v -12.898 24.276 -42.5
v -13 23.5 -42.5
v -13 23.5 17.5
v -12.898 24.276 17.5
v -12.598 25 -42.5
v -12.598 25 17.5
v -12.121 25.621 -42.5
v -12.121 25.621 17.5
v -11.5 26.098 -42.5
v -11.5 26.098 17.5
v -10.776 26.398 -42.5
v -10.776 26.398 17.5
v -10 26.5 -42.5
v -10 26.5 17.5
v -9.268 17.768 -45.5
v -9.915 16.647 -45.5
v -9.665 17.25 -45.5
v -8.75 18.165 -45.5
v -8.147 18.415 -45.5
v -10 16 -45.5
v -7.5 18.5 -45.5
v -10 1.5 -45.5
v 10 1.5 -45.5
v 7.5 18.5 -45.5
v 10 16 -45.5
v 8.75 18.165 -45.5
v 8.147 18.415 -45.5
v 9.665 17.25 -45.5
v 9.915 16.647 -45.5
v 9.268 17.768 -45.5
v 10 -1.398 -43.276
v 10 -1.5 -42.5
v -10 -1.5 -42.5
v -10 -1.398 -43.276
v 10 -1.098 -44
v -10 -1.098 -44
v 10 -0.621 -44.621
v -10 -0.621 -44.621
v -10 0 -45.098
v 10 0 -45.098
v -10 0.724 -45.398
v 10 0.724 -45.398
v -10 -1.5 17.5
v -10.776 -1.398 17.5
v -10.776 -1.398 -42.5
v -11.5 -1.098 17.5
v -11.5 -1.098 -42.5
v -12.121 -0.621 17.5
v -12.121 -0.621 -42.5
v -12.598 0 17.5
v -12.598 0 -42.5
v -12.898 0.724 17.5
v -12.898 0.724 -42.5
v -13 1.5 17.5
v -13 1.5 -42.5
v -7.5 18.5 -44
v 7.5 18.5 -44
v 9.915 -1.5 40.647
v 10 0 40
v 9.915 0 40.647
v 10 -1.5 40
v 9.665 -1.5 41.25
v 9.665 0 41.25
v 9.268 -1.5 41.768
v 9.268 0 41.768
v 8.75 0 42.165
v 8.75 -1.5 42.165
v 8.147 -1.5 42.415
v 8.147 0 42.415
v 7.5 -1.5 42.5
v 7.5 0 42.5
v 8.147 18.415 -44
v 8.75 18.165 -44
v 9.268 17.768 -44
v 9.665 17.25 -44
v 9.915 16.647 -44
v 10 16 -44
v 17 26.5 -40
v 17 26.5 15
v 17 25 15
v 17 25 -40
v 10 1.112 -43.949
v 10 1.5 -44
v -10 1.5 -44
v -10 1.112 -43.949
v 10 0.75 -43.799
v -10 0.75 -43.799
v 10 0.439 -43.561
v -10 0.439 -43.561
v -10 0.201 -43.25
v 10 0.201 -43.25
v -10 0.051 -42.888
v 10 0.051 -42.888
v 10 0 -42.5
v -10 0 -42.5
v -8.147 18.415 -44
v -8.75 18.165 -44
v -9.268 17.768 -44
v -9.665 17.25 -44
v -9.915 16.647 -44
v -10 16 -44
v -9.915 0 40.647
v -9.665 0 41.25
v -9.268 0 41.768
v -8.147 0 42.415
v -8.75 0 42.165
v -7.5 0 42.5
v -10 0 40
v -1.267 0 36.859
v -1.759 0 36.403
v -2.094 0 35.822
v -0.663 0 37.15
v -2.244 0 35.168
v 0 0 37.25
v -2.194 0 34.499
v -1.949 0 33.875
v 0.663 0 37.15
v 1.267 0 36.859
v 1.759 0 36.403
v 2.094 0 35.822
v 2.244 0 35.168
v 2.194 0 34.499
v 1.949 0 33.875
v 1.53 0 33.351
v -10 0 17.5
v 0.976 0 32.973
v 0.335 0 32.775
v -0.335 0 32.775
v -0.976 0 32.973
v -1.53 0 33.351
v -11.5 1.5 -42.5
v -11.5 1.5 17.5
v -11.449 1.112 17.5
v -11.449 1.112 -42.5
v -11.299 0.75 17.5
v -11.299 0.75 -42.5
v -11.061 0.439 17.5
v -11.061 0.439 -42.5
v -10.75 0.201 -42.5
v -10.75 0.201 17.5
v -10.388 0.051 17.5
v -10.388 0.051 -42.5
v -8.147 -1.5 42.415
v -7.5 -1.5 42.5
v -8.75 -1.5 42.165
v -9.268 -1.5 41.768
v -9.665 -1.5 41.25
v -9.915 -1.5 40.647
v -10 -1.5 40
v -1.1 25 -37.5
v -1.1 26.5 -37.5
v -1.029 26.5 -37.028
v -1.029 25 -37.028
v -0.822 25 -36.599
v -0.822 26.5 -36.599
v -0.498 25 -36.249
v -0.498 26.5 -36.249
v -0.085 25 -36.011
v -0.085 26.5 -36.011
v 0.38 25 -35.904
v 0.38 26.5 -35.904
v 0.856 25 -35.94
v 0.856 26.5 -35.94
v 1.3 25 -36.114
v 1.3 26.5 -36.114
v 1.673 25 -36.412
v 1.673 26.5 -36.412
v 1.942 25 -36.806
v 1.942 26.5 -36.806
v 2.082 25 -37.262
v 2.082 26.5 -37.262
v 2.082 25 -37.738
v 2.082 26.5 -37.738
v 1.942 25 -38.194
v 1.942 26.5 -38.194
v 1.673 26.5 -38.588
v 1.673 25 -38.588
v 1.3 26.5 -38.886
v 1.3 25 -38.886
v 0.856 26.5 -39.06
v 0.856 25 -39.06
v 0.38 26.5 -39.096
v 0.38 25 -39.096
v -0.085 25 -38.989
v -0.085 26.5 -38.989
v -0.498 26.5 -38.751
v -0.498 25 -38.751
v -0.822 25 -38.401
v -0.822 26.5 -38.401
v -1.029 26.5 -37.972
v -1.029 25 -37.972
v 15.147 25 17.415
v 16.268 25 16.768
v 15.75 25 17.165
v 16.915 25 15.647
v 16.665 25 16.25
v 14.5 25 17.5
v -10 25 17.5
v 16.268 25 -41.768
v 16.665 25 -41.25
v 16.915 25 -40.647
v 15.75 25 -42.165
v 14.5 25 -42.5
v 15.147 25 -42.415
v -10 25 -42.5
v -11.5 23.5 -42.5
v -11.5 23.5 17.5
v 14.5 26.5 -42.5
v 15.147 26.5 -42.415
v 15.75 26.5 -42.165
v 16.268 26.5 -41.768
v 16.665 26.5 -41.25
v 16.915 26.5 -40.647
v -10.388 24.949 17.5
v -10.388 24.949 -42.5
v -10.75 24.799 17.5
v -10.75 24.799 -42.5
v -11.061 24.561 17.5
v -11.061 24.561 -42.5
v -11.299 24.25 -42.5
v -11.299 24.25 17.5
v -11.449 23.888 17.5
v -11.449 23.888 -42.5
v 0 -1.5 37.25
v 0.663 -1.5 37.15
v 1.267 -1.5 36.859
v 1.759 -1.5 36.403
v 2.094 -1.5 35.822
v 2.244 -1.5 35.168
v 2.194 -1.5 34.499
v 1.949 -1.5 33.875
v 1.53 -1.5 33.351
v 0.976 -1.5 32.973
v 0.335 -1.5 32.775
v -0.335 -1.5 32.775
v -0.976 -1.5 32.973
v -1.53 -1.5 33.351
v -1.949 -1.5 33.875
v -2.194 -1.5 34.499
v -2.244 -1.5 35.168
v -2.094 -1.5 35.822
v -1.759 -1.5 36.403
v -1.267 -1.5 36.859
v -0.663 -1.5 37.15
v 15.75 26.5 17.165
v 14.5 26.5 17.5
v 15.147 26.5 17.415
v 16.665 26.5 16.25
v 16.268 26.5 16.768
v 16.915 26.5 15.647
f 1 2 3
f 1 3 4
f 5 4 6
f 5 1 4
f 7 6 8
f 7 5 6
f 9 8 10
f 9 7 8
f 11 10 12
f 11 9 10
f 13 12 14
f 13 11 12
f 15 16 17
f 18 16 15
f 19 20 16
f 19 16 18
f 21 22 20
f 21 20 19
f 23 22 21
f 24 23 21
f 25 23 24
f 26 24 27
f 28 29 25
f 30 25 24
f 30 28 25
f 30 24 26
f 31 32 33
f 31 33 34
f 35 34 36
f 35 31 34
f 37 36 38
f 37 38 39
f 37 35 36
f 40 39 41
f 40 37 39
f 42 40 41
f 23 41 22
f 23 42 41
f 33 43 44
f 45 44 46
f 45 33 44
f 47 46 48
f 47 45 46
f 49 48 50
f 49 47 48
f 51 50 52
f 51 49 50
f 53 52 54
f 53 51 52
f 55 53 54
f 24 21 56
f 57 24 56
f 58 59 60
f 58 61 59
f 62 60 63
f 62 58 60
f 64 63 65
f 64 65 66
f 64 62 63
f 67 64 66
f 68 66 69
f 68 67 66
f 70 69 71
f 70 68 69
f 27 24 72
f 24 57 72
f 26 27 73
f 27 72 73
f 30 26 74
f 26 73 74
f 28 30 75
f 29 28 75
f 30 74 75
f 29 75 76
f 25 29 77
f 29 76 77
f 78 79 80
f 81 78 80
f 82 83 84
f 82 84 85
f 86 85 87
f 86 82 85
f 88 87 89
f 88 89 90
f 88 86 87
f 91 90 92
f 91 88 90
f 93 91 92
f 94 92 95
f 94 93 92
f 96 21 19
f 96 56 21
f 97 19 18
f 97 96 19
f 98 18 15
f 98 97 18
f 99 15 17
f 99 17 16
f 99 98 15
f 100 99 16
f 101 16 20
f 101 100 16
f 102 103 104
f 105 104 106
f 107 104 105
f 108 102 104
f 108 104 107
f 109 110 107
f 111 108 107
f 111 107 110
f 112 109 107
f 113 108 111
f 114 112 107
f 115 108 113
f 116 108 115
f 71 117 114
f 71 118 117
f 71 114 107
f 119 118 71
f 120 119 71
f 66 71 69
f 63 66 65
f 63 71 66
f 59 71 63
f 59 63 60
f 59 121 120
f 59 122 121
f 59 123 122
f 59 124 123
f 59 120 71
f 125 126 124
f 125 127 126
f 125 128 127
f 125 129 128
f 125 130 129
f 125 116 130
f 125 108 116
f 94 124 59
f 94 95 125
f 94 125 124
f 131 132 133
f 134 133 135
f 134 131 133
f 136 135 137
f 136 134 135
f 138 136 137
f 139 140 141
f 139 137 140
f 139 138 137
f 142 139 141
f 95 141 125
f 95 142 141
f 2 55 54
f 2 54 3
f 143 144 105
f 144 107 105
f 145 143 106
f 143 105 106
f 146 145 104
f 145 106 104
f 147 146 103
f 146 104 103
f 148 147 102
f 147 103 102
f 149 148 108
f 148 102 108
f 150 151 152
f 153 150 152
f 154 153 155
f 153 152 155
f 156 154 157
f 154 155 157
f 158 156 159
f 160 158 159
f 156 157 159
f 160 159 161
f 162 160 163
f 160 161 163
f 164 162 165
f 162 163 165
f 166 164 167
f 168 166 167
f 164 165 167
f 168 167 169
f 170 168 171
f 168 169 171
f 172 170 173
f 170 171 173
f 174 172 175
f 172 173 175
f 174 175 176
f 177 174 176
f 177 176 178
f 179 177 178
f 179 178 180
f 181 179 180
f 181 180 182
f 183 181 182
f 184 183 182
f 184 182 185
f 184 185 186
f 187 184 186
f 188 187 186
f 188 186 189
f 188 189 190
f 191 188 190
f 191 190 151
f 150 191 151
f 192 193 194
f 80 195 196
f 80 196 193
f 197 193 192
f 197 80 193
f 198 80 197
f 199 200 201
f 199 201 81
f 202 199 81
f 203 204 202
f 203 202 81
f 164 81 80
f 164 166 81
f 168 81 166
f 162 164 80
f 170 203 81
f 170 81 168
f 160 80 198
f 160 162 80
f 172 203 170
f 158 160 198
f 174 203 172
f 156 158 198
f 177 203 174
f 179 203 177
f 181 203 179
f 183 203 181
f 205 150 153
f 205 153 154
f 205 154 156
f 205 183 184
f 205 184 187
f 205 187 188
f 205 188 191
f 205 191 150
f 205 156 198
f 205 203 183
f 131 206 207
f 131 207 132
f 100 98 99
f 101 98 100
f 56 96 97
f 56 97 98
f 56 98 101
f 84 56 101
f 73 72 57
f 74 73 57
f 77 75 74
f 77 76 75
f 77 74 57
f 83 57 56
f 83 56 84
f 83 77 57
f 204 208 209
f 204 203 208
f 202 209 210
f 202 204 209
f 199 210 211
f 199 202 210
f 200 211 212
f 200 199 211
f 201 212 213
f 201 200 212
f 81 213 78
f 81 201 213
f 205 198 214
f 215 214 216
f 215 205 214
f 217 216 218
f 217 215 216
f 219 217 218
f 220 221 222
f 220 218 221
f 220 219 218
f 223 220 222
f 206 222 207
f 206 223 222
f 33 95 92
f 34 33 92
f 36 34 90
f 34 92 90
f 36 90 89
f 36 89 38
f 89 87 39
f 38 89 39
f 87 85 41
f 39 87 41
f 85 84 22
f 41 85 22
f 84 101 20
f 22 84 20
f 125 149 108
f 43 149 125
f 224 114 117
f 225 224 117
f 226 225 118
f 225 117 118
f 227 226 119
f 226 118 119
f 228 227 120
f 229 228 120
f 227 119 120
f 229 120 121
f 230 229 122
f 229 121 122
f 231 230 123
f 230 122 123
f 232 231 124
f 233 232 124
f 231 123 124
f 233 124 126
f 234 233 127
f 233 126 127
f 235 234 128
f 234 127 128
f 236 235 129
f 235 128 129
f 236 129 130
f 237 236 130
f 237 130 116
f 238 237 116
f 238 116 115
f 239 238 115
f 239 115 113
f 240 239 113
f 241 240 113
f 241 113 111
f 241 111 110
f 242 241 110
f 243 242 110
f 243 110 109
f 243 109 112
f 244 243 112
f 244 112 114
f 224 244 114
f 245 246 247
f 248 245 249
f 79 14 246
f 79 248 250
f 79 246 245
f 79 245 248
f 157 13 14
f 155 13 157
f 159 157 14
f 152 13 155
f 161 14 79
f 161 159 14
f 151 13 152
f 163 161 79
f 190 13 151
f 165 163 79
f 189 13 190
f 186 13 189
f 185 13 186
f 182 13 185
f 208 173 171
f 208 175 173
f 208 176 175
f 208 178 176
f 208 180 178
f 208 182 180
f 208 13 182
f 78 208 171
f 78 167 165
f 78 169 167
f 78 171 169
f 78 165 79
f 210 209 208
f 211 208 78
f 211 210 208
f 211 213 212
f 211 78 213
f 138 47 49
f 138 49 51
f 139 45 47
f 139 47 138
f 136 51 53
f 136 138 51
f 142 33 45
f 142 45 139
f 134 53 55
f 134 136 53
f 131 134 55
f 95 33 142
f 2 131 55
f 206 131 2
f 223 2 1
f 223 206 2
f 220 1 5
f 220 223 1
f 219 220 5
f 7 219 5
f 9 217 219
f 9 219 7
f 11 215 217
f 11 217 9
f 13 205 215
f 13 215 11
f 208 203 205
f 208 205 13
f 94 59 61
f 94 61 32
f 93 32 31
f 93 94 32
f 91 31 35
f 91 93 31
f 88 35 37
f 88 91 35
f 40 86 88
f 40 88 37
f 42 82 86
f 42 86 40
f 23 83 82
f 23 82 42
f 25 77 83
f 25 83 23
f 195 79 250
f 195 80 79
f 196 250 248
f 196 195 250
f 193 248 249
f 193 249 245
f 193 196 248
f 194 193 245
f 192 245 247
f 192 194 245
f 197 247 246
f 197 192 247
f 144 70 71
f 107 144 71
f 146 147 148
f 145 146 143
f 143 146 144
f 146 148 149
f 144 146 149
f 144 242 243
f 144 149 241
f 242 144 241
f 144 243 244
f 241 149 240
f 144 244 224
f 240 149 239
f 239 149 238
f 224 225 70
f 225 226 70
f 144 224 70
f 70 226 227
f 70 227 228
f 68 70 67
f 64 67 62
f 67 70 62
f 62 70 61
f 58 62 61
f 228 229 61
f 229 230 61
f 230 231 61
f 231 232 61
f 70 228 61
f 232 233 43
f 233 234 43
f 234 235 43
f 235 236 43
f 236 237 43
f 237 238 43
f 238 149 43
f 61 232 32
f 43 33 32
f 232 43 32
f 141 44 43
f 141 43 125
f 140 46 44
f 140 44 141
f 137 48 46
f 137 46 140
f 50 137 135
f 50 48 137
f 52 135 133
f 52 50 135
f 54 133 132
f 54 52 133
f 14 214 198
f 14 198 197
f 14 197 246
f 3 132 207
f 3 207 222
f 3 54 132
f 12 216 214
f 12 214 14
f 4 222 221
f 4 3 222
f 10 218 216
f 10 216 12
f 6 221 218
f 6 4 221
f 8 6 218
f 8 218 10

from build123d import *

# Parameters (mm, degrees)
SKETCH1_W                    = 20
SKETCH1_H                    = 85
BASE_FLANGE1_DEPTH           = 1.5
EDGE_FLANGE1_DEPTH           = 85
EDGE_FLANGE2_STRIP_W         = 9
EDGE_FLANGE2_STRIP_H         = 1.5
EDGE_FLANGE2_STRIP_CUT_DEPTH = 85
EDGE_FLANGE2_DEPTH           = 85
CUT_EXTRUDE1_DEPTH           = 53.891398166
CUT_EXTRUDE1_DEPTH_BACK      = 53.891398166
SKETCH13_W                   = 25
SKETCH13_H                   = 26.5
CUT_EXTRUDE2_DEPTH           = 53.891398166
CUT_EXTRUDE2_DEPTH_BACK      = 53.891398166
SKETCH14_W                   = 2.598076211
SKETCH14_H                   = 25
SKETCH15_R                   = 2.25
CAGE_MOUNTING_HOLE_DEPTH     = 53.891398166
EDGE_FLANGE3_DEPTH           = 20
ARDUINO_MOUNTING_HOLE_REACH  = 58.065
SKETCH19_R                   = 1.6
FILLET1_R                    = 2.5


# Sheet-metal steps are written as plain solids
with BuildPart() as part:
    # Sketch1 → Base-Flange1 (new body)
    with BuildSketch(Plane(origin=(0, 0, 0), x_dir=(1, 0, 0), z_dir=(0, 1, 0))):
        Rectangle(SKETCH1_W, SKETCH1_H)
    extrude(amount=-BASE_FLANGE1_DEPTH)

    # Edge-Flange1 section (across the edge) → Edge-Flange1 (add)
    with BuildSketch(Plane(origin=(-11.5, 0, -42.5), x_dir=(1, 0, 0), z_dir=(0, 0, 1))):
        with BuildLine():
            Line((-1.5, 1.5), (-1.5, 25))
            Line((-1.5, 25), (0, 25))
            Line((0, 25), (0, 1.5))
            ThreePointArc((0, 1.5), (0.439339828, 0.439339828), (1.5, 0))
            Line((1.5, 0), (1.5, -1.5))
            ThreePointArc((1.5, -1.5), (-0.621320344, -0.621320344), (-1.5, 1.5))
        make_face()
    extrude(amount=EDGE_FLANGE1_DEPTH)

    # Edge-Flange2 strip (across the edge) → Edge-Flange2 strip cut (cut)
    with BuildSketch(Plane(origin=(-11.5, 25, -42.5), x_dir=(0, -1, 0), z_dir=(0, 0, 1))):
        with Locations((-3, -0.75)):
            Rectangle(EDGE_FLANGE2_STRIP_W, EDGE_FLANGE2_STRIP_H)
    extrude(amount=EDGE_FLANGE2_STRIP_CUT_DEPTH, mode=Mode.SUBTRACT)

    # Edge-Flange2 section (across the edge) → Edge-Flange2 (add)
    with BuildSketch(Plane(origin=(-11.5, 25, -42.5), x_dir=(0, -1, 0), z_dir=(0, 0, 1))):
        with BuildLine():
            Line((-1.5, 1.5), (-1.5, 28.5))
            Line((-1.5, 28.5), (0, 28.5))
            Line((0, 28.5), (0, 1.5))
            ThreePointArc((0, 1.5), (0.439339828, 0.439339828), (1.5, 0))
            Line((1.5, 0), (1.5, -1.5))
            ThreePointArc((1.5, -1.5), (-0.621320344, -0.621320344), (-1.5, 1.5))
        make_face()
    extrude(amount=EDGE_FLANGE2_DEPTH)

    # Sketch13 → Cut-Extrude1 (cut, two sides: drawn at the far end of the back side and taken through both)
    with BuildSketch(Plane(origin=(0, 0, 0), x_dir=(0, 0, -1), z_dir=(1, 0, 0)).offset(-CUT_EXTRUDE1_DEPTH_BACK)):
        with Locations((-30, 13.25)):
            Rectangle(SKETCH13_W, SKETCH13_H)
    extrude(amount=CUT_EXTRUDE1_DEPTH + CUT_EXTRUDE1_DEPTH_BACK, mode=Mode.SUBTRACT)

    # Sketch14 → Cut-Extrude2 (cut, two sides: drawn at the far end of the back side and taken through both)
    with BuildSketch(Plane(origin=(0, 0, 0), x_dir=(1, 0, 0), z_dir=(0, 1, 0)).offset(-CUT_EXTRUDE2_DEPTH_BACK)):
        with Locations((-11.299038105, -30)):
            Rectangle(SKETCH14_W, SKETCH14_H)
    extrude(amount=CUT_EXTRUDE2_DEPTH + CUT_EXTRUDE2_DEPTH_BACK, mode=Mode.SUBTRACT)

    # Sketch15 → cage mounting hole (cut, through all)
    with BuildSketch(Plane(origin=(0, 0, 0), x_dir=(1, 0, 0), z_dir=(0, 1, 0))):
        with Locations(Location((0, -35, 0), (0, 0, 270))):
            Circle(SKETCH15_R)
    extrude(amount=-CAGE_MOUNTING_HOLE_DEPTH, mode=Mode.SUBTRACT)

    # Edge-Flange3 section (across the edge) → Edge-Flange3 (add)
    with BuildSketch(Plane(origin=(10, 0, -44), x_dir=(0, 0, 1), z_dir=(-1, 0, 0))):
        with BuildLine():
            Line((-1.5, 1.5), (-1.5, 18.5))
            Line((-1.5, 18.5), (0, 18.5))
            Line((0, 18.5), (0, 1.5))
            ThreePointArc((0, 1.5), (0.439339828, 0.439339828), (1.5, 0))
            Line((1.5, 0), (1.5, -1.5))
            ThreePointArc((1.5, -1.5), (-0.621320344, -0.621320344), (-1.5, 1.5))
        make_face()
    extrude(amount=EDGE_FLANGE3_DEPTH)

    # Sketch19 → arduino mounting hole (cut, up to next)
    with BuildSketch(Plane(origin=(0, 26.5, 0), x_dir=(1, 0, 0), z_dir=(0, 1, 0)), mode=Mode.PRIVATE) as arduino_mounting_hole_sk1:
        with Locations(Location((0.5, 37.5, 0), (0, 0, 180))):
            Circle(SKETCH19_R)
    arduino_mounting_hole_tool1 = extrude(arduino_mounting_hole_sk1.sketch, amount=-ARDUINO_MOUNTING_HOLE_REACH, mode=Mode.PRIVATE) & part.part
    add(arduino_mounting_hole_tool1.solids().sort_by_distance((0.5, 26.5, -37.5))[0], mode=Mode.SUBTRACT)

    # Fillet1
    fillet1_edges = [part.edges().sort_by_distance(p)[0] for p in [
        (10, 18.5, -44.75),
        (-10, 18.5, -44.75),
        (17, 25.75, -42.5),
        (17, 25.75, 17.5),
        (10, -0.75, 42.5),
        (-10, -0.75, 42.5),
    ]]
    fillet(fillet1_edges, radius=FILLET1_R)


solid = part.part
